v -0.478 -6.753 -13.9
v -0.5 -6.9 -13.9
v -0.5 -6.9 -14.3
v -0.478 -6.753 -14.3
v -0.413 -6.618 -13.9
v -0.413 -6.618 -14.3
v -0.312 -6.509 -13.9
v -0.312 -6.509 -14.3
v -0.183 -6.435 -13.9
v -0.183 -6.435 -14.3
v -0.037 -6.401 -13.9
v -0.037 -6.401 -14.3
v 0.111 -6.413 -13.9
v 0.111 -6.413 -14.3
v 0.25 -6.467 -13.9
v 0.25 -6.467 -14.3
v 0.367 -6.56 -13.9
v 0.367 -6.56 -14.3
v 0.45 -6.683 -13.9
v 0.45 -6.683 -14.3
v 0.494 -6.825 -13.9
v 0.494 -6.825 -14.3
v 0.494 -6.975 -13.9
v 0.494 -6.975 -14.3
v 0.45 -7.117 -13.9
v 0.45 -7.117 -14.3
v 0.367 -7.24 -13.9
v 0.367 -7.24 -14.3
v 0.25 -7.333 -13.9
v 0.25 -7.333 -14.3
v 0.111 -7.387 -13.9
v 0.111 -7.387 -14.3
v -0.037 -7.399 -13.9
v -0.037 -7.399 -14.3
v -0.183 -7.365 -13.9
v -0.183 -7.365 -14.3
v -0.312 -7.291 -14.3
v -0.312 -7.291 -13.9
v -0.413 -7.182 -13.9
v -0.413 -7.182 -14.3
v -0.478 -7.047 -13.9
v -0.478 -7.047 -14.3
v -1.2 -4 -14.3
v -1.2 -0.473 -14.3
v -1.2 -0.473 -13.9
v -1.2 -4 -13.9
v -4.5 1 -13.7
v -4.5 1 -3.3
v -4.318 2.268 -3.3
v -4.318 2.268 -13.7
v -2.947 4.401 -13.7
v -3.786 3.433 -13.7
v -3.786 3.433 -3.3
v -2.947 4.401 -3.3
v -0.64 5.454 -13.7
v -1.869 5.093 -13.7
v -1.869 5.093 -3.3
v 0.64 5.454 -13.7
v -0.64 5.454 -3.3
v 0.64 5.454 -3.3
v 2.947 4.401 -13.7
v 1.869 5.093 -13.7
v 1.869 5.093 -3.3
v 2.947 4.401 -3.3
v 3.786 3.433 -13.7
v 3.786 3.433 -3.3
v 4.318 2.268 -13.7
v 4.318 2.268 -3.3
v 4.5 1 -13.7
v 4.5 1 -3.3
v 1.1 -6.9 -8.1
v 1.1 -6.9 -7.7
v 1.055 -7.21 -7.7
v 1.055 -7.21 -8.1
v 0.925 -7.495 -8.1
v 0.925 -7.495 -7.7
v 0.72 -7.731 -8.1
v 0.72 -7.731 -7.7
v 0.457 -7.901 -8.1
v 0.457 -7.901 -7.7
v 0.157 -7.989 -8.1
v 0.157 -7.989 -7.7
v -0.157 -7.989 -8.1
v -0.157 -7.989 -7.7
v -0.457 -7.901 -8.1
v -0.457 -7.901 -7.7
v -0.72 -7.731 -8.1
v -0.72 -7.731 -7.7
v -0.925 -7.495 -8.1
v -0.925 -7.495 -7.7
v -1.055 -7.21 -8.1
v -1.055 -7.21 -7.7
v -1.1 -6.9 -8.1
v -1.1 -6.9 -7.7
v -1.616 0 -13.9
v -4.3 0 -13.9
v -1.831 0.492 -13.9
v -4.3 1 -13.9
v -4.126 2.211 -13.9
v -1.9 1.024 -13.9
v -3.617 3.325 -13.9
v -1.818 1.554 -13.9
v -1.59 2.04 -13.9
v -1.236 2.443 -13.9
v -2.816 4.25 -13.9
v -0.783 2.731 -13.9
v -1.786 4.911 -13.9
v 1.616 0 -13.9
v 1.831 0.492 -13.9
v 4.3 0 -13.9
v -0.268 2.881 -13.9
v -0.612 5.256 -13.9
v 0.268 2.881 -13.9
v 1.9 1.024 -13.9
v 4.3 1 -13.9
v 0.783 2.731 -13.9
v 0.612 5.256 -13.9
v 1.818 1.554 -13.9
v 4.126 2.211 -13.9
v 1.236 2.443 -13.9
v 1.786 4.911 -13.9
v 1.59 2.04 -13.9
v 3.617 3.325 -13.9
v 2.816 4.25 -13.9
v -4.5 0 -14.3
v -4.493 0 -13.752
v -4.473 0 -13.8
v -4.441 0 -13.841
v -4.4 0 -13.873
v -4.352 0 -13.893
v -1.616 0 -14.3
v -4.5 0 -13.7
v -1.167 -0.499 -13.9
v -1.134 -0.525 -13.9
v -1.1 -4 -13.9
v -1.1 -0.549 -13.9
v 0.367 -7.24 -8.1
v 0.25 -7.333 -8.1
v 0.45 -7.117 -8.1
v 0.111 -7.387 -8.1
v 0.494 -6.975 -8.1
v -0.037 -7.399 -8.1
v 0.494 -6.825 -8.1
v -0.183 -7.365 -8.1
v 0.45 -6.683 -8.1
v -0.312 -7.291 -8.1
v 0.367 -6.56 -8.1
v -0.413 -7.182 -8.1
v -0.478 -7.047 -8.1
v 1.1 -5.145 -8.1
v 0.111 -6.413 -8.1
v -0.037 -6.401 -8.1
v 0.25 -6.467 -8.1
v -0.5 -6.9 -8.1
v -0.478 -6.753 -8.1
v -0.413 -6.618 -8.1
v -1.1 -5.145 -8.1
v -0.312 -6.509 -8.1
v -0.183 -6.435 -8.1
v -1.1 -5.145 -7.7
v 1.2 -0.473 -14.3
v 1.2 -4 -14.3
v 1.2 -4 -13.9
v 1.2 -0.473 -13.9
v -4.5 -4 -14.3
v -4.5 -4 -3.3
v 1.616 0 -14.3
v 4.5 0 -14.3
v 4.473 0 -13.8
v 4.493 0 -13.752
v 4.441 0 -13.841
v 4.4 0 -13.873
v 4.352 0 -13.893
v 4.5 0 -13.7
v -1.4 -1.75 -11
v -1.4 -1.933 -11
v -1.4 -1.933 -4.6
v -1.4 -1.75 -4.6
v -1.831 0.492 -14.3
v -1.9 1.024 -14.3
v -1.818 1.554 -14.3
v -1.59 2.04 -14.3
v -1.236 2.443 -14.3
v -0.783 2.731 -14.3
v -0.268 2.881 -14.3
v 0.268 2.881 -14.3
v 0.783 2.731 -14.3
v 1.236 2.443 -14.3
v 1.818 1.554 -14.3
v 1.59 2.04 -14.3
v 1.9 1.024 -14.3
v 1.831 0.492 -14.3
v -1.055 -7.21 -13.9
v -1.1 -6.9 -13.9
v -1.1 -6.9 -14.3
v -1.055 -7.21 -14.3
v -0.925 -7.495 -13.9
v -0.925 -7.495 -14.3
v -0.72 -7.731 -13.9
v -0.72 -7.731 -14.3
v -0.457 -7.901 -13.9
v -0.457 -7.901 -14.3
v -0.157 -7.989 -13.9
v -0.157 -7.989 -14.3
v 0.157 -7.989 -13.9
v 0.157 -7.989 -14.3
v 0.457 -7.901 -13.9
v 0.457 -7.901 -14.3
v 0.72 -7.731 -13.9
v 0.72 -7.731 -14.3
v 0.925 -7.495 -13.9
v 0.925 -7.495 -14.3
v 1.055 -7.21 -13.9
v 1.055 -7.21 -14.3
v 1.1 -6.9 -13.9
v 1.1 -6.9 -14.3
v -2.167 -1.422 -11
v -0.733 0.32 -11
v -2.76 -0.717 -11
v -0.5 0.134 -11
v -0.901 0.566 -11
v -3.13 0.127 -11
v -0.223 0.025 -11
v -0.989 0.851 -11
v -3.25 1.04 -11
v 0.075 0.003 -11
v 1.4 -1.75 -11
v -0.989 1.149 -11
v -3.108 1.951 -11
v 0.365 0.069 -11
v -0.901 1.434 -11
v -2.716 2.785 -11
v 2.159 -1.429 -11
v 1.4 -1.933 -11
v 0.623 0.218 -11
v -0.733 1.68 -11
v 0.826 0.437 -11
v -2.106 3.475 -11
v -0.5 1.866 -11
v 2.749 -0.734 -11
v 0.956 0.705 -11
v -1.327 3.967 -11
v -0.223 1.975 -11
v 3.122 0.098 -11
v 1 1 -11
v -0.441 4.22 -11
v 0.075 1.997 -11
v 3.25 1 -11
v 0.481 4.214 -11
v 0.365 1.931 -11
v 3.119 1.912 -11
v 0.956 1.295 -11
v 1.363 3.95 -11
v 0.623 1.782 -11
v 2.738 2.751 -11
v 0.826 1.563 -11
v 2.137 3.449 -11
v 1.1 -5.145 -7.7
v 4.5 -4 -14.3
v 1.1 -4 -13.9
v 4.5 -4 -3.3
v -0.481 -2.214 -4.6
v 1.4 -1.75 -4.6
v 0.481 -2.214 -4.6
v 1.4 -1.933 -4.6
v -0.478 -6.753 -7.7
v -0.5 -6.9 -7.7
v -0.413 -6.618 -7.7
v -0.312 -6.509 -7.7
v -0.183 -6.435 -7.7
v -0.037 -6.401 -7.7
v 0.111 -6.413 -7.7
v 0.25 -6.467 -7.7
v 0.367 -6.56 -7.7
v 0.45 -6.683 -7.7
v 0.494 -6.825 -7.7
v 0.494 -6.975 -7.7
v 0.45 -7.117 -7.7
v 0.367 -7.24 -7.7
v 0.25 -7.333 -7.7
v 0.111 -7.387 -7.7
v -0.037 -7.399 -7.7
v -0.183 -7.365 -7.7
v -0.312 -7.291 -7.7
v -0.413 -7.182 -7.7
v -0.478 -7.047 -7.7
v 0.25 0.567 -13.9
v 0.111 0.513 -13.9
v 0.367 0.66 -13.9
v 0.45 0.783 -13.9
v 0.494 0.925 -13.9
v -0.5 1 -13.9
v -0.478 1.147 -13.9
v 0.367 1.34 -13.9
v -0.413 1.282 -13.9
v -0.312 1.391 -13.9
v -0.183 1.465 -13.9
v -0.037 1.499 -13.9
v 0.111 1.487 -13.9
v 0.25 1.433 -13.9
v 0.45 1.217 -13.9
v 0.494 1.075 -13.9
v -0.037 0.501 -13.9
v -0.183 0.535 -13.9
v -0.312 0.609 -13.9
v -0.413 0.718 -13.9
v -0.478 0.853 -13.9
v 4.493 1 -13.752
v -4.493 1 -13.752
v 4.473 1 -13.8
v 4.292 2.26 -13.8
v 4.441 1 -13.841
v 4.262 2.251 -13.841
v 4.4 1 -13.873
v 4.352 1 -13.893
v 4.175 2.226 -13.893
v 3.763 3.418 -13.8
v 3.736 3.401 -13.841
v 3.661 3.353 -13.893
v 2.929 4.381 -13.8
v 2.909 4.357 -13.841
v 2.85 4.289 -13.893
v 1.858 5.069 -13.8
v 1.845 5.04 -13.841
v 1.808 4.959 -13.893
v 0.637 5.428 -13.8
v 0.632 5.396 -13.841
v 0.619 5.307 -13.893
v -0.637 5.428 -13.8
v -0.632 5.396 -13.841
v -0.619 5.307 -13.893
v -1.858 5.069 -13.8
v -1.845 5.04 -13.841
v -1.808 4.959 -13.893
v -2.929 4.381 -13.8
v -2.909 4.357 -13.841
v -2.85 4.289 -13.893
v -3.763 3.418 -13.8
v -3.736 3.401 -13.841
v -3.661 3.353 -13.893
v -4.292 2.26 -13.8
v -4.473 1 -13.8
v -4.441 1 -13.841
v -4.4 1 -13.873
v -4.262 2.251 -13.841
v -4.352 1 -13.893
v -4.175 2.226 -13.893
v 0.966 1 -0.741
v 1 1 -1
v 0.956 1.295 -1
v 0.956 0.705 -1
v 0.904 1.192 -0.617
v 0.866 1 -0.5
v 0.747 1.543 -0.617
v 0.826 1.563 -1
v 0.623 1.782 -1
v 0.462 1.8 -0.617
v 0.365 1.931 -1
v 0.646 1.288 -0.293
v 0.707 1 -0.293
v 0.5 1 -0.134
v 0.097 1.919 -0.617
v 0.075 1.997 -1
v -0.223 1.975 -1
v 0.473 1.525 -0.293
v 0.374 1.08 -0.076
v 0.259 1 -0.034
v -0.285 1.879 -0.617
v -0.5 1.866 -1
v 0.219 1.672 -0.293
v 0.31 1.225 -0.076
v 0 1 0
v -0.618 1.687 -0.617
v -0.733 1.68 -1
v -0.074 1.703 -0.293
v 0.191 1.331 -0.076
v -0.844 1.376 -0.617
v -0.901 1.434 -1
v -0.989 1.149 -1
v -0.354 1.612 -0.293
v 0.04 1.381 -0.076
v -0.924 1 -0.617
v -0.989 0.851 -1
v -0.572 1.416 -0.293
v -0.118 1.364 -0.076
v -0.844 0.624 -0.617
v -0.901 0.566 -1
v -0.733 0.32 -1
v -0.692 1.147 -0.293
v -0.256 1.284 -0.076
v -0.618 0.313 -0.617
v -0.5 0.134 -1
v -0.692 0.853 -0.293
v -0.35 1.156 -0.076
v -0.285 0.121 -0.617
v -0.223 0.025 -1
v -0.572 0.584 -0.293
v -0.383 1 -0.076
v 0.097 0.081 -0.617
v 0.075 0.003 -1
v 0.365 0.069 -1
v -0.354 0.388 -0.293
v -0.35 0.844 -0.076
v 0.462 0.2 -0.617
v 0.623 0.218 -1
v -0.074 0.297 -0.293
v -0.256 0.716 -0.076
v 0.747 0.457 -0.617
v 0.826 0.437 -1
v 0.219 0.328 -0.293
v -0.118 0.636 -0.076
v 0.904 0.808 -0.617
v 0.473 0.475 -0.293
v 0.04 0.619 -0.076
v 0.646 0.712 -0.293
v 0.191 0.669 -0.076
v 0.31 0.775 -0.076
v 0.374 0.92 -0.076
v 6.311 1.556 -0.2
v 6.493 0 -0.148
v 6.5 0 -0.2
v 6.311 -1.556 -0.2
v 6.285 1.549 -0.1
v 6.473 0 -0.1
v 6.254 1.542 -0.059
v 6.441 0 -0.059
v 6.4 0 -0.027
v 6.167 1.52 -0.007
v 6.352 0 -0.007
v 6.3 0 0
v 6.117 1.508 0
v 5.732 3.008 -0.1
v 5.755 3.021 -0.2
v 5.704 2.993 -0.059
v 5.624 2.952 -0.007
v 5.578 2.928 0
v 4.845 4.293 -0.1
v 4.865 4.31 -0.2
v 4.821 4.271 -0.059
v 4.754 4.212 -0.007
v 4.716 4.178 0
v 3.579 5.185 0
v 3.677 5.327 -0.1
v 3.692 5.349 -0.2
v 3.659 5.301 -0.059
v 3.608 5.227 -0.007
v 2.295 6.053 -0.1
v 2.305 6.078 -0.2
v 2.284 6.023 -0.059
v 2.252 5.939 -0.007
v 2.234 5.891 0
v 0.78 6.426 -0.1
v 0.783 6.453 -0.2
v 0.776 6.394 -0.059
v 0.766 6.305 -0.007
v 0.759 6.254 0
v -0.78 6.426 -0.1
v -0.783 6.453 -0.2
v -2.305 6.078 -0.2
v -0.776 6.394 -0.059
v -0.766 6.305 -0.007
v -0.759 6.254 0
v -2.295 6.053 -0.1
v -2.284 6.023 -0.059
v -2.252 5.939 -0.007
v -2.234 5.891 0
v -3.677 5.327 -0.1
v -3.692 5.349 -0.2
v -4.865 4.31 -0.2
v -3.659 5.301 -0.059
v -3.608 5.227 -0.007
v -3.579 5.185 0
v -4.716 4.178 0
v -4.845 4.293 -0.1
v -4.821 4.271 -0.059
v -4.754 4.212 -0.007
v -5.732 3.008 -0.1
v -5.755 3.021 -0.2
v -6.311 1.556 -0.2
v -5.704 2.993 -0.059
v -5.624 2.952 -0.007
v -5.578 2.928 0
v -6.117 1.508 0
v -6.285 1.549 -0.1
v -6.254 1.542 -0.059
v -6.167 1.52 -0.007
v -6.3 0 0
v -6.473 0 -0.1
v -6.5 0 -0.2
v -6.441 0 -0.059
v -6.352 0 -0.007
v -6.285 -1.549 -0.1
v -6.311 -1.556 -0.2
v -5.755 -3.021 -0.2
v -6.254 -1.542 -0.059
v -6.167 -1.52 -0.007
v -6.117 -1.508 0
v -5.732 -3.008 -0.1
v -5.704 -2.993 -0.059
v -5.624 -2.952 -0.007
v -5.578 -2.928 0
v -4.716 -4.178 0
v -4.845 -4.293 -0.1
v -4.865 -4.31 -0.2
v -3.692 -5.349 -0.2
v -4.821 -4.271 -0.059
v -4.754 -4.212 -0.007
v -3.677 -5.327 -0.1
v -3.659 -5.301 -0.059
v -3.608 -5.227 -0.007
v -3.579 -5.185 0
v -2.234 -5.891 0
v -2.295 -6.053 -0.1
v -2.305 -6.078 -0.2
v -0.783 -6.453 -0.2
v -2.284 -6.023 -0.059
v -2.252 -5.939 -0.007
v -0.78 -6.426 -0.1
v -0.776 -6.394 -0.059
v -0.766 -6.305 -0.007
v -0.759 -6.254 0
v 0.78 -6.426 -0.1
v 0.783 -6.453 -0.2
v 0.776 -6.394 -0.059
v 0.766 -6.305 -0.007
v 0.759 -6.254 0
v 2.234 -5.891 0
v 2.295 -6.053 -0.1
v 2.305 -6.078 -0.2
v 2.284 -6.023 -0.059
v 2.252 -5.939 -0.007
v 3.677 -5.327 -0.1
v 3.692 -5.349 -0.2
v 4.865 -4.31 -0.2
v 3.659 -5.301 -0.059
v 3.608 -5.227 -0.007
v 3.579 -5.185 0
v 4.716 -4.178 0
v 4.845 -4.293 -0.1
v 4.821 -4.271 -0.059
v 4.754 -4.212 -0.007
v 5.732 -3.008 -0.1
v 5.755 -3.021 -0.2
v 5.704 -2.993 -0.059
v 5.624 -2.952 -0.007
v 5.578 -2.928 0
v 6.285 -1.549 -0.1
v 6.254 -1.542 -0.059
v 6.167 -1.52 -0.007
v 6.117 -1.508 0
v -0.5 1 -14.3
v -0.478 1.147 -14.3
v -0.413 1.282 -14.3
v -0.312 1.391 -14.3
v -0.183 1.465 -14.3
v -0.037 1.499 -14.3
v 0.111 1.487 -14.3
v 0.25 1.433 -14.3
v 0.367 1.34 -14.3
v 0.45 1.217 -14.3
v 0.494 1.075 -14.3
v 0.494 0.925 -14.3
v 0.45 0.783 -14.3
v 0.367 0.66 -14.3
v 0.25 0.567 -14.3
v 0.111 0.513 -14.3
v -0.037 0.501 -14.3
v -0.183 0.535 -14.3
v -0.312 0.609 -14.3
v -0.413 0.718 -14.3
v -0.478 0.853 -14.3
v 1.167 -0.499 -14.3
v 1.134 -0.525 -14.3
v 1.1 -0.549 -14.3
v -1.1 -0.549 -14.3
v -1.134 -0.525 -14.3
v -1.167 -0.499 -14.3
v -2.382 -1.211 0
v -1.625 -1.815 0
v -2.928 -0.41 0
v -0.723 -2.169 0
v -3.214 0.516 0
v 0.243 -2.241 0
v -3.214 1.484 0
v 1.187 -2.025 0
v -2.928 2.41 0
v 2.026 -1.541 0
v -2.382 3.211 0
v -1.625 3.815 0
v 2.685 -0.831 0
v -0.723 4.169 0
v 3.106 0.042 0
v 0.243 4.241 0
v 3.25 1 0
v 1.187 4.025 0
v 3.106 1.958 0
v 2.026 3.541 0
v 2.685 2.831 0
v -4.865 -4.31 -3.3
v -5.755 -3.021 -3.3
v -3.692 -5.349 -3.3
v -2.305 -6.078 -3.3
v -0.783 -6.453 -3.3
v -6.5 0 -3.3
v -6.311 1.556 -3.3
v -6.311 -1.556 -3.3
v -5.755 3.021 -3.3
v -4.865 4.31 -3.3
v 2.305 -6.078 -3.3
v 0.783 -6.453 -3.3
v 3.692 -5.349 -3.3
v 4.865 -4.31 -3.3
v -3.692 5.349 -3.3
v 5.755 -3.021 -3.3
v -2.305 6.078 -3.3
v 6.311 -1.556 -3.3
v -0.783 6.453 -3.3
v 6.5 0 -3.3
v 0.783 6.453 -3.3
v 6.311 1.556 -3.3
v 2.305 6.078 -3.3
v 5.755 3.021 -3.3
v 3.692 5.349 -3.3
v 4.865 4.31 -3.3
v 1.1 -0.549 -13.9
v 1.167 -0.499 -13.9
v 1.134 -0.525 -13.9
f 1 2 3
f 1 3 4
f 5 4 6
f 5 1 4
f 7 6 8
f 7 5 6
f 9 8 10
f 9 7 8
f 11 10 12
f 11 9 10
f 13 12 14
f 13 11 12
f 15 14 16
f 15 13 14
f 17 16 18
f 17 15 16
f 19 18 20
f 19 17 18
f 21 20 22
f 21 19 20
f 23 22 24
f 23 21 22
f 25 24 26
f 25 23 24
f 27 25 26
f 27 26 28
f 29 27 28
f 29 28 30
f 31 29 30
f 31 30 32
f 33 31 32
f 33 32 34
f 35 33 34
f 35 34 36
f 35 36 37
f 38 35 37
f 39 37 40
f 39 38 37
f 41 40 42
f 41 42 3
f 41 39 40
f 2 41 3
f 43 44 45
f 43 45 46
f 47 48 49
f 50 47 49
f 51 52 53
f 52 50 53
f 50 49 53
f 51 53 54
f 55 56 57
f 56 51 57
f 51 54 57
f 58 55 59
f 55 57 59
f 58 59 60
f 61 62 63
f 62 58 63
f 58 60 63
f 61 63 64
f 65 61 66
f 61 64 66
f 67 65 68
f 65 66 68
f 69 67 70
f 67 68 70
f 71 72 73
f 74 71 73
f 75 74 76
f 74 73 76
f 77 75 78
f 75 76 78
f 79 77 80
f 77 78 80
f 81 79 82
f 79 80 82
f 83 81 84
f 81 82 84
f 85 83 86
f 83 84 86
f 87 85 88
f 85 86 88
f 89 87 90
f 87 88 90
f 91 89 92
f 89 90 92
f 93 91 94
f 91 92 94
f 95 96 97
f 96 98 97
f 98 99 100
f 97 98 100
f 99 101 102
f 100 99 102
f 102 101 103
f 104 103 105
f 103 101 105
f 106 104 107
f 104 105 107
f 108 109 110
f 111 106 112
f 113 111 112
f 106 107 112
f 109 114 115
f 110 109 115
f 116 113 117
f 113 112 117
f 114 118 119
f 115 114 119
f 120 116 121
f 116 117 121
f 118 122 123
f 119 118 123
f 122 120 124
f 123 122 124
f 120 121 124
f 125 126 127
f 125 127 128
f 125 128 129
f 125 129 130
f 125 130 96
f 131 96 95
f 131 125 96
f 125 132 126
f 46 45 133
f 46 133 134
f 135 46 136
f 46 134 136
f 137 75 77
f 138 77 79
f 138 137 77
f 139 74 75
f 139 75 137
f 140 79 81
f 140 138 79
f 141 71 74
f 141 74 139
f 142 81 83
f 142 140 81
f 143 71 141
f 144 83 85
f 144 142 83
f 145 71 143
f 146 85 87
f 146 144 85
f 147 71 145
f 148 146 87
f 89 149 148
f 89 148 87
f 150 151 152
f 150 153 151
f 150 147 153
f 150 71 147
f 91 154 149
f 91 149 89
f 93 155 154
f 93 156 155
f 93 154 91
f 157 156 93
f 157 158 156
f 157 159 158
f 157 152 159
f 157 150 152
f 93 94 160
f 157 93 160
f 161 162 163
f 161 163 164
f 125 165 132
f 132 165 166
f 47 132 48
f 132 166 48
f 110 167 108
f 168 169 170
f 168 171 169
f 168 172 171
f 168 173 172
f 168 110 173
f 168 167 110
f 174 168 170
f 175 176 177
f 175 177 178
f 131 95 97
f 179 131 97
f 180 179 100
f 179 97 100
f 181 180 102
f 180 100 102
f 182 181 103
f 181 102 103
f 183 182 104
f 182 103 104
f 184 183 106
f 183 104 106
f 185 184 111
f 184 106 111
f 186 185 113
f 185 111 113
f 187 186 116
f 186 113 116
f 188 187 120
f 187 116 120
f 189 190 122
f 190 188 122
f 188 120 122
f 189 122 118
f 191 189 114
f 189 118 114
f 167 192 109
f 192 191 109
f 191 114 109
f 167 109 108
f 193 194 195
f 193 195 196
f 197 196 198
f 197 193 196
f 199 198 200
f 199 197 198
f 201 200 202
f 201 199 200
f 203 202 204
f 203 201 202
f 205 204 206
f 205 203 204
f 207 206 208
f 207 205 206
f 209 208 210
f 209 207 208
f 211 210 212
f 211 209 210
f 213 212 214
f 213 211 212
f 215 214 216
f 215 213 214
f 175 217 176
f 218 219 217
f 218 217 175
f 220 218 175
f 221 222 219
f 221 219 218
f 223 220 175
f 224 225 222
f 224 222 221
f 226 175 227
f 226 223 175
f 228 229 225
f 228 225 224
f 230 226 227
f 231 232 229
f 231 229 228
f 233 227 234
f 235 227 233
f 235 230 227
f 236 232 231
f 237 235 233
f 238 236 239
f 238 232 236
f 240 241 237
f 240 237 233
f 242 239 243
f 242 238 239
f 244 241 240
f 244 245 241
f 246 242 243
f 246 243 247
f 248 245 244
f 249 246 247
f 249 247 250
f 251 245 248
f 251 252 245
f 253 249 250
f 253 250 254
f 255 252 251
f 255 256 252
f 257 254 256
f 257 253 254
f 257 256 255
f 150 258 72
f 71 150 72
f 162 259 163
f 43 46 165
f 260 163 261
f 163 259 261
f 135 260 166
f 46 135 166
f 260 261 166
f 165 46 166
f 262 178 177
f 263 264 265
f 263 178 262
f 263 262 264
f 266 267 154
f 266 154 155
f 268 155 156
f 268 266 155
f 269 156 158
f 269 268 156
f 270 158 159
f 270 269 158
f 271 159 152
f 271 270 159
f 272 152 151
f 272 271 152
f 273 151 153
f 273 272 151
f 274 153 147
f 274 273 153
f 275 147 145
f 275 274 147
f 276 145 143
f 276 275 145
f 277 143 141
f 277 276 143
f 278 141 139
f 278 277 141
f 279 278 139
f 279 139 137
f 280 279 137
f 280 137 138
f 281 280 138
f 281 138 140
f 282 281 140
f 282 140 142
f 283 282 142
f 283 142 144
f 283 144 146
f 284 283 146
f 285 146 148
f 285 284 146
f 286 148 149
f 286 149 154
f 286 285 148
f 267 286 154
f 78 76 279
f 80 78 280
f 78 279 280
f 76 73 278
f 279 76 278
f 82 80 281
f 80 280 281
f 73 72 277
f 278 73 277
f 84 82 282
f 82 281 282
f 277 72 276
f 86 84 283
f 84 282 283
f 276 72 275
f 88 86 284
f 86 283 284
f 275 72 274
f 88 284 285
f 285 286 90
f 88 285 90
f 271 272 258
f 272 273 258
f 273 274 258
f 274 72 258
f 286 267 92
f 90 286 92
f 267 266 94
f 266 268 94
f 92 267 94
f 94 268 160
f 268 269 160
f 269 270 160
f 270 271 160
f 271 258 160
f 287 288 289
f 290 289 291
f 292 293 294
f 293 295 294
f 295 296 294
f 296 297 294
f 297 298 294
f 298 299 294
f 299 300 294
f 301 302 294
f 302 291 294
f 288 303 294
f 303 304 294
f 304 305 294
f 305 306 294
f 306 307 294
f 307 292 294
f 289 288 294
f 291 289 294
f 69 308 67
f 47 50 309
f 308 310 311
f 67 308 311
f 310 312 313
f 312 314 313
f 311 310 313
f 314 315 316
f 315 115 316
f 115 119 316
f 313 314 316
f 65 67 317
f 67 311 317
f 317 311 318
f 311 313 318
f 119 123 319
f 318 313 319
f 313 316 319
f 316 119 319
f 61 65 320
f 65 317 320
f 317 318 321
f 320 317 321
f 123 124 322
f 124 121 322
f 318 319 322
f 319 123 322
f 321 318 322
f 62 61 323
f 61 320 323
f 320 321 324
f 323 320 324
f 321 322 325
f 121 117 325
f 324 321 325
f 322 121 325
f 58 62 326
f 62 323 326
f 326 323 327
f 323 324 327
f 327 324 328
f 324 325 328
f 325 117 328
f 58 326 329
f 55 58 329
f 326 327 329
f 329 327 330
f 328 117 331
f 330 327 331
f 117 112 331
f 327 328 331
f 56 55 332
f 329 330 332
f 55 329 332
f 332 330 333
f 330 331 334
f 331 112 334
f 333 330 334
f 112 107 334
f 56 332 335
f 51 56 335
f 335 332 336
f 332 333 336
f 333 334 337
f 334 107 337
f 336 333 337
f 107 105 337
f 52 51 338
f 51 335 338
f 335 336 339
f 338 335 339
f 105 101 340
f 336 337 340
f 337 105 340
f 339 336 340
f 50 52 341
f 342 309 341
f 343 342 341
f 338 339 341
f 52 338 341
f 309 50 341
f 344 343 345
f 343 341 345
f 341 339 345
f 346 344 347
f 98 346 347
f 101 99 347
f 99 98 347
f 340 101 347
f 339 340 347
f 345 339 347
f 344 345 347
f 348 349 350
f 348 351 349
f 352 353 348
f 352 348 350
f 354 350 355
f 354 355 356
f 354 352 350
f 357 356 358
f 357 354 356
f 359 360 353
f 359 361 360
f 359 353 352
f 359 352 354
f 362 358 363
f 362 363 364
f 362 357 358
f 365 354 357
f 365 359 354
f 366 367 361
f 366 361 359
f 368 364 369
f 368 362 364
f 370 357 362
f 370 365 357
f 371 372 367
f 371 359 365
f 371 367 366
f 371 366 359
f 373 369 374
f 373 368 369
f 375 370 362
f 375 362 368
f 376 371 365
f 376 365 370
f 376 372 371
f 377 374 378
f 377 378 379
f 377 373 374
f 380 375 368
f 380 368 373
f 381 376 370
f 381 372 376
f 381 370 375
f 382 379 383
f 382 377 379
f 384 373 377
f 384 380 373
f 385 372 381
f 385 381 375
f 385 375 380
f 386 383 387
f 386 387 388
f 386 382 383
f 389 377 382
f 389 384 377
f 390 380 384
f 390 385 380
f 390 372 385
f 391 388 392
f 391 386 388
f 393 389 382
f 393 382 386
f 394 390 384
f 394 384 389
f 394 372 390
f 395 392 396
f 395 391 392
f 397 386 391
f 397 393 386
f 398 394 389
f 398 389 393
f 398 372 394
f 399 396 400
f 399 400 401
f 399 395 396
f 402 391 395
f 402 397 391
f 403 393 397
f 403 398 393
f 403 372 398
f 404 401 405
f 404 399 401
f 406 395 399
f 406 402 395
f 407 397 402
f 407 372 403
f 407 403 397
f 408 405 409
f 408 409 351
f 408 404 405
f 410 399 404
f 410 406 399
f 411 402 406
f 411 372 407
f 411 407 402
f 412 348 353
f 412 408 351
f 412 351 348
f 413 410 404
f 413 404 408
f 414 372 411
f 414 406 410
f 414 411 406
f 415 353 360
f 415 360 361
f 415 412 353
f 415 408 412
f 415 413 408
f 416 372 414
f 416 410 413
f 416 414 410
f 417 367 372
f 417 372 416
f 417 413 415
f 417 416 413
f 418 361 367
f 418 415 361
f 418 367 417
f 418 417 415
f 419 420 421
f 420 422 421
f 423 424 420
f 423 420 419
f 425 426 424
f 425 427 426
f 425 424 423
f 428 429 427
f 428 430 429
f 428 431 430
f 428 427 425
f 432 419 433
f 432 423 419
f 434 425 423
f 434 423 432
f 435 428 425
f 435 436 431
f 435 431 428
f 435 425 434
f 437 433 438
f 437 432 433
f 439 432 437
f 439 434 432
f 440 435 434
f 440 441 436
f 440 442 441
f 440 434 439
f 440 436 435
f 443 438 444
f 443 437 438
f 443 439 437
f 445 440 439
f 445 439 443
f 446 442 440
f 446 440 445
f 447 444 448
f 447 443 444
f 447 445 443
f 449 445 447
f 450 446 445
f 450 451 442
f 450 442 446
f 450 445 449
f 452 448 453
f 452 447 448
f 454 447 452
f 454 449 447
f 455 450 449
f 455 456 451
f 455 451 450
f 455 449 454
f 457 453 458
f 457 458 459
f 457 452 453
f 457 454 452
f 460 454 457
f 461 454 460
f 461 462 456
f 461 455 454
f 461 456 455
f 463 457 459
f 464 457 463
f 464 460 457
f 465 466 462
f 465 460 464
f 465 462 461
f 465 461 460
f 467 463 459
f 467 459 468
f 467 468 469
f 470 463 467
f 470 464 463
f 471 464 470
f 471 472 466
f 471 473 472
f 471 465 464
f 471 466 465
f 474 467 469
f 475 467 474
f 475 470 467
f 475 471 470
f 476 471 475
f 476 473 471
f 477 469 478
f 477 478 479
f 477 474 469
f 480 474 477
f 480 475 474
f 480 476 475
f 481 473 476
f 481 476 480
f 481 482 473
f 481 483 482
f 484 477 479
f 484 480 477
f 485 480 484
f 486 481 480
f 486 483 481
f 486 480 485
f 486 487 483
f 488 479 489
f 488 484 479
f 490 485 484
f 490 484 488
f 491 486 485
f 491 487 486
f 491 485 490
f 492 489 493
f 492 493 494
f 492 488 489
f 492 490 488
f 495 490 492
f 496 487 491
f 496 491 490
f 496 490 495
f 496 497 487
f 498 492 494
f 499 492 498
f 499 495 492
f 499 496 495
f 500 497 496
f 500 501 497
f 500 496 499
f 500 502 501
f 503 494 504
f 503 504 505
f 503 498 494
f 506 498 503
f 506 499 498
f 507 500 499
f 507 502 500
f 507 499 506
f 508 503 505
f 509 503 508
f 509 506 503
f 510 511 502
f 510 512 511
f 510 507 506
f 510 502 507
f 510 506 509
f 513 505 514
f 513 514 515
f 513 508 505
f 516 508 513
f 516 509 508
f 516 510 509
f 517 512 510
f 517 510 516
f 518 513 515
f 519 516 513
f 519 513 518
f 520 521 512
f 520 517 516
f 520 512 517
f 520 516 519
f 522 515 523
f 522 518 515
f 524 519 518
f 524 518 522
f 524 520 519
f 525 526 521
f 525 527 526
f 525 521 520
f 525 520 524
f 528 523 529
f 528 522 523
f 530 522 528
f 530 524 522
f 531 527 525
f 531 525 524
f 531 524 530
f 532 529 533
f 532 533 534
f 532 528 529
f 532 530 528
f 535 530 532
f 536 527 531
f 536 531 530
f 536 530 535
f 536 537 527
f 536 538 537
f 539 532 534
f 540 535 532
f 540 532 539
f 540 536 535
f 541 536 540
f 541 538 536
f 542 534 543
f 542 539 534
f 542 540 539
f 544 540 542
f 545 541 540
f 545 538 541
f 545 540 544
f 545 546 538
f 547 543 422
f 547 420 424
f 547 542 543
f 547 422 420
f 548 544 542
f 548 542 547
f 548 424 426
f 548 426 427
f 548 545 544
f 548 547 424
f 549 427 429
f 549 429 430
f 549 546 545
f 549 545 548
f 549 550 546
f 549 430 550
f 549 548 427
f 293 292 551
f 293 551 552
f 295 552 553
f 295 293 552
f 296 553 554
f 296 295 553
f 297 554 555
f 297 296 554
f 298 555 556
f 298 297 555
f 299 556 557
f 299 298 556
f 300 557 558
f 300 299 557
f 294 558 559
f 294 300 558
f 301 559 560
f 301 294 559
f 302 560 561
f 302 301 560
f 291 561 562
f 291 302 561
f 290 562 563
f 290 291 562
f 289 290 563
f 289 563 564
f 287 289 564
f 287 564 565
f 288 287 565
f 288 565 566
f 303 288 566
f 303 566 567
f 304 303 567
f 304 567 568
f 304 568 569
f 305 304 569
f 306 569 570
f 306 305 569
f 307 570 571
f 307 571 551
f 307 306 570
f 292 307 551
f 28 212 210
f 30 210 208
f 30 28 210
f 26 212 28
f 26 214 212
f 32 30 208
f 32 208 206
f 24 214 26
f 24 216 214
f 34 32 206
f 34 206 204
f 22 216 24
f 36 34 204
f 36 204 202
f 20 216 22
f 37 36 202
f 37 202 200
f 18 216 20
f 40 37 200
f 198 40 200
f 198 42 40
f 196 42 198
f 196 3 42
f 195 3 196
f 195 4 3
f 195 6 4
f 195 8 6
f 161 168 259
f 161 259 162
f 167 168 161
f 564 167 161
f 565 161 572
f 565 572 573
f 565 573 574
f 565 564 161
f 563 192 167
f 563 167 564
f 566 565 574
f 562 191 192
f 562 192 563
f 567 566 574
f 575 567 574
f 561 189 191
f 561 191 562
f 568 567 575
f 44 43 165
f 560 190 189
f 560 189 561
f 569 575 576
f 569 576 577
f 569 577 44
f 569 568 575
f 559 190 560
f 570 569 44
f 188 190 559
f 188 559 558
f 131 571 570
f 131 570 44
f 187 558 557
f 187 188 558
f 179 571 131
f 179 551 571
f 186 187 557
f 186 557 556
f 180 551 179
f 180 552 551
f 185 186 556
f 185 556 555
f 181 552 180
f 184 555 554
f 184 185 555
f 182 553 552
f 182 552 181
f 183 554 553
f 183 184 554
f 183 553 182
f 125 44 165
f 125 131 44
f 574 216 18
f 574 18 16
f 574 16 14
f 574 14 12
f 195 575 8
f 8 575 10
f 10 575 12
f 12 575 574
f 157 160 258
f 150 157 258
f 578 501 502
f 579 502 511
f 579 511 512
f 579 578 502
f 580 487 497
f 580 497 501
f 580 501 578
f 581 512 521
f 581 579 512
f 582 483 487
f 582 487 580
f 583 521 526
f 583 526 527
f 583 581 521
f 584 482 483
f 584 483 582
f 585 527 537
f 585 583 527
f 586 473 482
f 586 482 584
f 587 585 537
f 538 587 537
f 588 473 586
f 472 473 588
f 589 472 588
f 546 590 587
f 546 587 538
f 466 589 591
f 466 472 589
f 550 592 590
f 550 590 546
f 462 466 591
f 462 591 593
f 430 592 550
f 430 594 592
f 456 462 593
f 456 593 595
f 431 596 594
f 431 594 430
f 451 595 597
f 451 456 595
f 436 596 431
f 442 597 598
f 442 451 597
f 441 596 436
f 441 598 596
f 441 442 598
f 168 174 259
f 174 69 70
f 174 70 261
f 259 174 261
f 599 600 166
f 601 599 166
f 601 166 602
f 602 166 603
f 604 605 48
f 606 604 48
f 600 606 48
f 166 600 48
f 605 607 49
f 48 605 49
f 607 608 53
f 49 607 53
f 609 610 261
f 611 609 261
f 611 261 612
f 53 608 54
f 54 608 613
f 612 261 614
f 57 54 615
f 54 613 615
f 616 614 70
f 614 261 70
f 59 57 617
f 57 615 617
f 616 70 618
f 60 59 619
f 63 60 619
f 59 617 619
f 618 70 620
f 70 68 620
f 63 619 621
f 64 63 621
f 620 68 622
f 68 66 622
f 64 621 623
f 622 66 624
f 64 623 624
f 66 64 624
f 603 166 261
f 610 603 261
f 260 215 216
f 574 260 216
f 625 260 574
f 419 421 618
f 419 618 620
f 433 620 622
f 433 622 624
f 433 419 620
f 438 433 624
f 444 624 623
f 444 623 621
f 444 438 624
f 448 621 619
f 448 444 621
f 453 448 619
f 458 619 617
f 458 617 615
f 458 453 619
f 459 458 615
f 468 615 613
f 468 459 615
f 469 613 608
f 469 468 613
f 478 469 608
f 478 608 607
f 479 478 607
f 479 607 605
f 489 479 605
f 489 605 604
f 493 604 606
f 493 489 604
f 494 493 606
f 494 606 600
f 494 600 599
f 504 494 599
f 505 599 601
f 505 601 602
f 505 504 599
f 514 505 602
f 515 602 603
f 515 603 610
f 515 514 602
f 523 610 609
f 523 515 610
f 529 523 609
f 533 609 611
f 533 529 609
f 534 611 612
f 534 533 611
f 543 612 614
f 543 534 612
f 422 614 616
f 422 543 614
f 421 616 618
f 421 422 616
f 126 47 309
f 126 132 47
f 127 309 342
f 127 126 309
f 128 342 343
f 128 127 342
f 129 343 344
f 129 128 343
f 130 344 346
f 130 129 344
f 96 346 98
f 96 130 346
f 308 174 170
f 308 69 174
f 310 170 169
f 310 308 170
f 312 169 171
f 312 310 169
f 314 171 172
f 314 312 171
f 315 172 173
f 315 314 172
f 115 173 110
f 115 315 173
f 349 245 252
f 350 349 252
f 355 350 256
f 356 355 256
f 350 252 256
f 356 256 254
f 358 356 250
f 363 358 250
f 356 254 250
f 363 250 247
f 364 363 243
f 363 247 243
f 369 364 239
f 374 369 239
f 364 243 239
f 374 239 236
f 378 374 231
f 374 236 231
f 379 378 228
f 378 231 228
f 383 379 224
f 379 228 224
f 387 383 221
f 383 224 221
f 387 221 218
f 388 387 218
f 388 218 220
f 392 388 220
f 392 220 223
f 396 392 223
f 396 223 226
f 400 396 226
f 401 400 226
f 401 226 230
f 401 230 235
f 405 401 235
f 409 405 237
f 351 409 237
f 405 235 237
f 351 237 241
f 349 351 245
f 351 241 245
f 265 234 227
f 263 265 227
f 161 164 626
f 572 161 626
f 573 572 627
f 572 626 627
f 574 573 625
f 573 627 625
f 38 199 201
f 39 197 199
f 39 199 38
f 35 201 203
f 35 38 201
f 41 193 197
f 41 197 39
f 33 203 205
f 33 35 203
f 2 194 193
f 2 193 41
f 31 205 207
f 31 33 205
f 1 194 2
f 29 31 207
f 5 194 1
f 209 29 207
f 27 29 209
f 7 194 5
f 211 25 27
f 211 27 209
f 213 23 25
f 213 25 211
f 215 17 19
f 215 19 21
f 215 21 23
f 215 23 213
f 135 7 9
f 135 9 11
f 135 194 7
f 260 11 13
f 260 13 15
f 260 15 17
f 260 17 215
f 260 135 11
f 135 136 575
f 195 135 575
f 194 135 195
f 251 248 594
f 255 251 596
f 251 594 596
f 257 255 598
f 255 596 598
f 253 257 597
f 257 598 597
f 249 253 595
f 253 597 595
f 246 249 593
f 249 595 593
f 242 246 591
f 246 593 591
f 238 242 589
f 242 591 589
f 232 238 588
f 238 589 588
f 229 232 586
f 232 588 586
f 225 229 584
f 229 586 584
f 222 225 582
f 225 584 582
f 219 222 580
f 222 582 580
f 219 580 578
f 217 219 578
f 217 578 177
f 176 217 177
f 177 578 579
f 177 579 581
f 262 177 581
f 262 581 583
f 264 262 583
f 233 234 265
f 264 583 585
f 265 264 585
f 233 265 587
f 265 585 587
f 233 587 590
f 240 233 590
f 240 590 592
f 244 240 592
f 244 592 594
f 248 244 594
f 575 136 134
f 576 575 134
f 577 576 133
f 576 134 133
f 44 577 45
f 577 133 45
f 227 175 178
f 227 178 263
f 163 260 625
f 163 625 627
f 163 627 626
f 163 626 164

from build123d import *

# Parameters (mm, degrees)
SKETCH1_R           = 6.5
BOSS_EXTRUDE1_DEPTH = 3.3
BOSS_EXTRUDE2_DEPTH = 11
SKETCH3_R           = 3.25
CUT_EXTRUDE1_DEPTH  = 11
SKETCH4_R           = 1
BOSS_EXTRUDE3_DEPTH = 11
FILLET1_R           = 1
CUT_EXTRUDE2_DEPTH  = 0.4
SKETCH6_R           = 0.5
BOSS_EXTRUDE4_DEPTH = 0.4
BOSS_EXTRUDE5_START = -0.4
SKETCH7_R           = 1.9
SKETCH7_R_2         = 0.5
BOSS_EXTRUDE5_DEPTH = 0.4
BOSS_EXTRUDE6_START = -0.4
SKETCH8_R           = 0.5
BOSS_EXTRUDE6_DEPTH = 0.4
SKETCH10_W          = 2.8
SKETCH10_H          = 1
BOSS_EXTRUDE8_DEPTH = 6.4
FILLET4_R           = 0.2
REDONDEO1_R         = 0.2


with BuildPart() as part:
    # Sketch1 → Boss-Extrude1 (new body)
    with BuildSketch(Plane.XY):
        Circle(SKETCH1_R)
    extrude(amount=-BOSS_EXTRUDE1_DEPTH)

    # Sketch2 → Boss-Extrude2 (add)
    with BuildSketch(Plane(origin=(0, 0, -3.3), x_dir=(-1, 0, 0), z_dir=(0, 0, -1))):
        with BuildLine():
            Line((-4.5, -4), (4.5, -4))
            Line((4.5, -4), (4.5, 1))
            ThreePointArc((4.5, 1), (0, 5.5), (-4.5, 1))
            Line((-4.5, 1), (-4.5, -4))
        make_face()
    extrude(amount=BOSS_EXTRUDE2_DEPTH)

    # Sketch3 → Cut-Extrude1 (cut)
    with BuildSketch(Plane.XY):
        with Locations((0, 1)):
            Circle(SKETCH3_R)
    extrude(amount=-CUT_EXTRUDE1_DEPTH, mode=Mode.SUBTRACT)

    # Sketch4 → Boss-Extrude3 (add)
    with BuildSketch(Plane.XY.offset(-11)):
        with Locations((0, 1)):
            Circle(SKETCH4_R)
    extrude(amount=BOSS_EXTRUDE3_DEPTH)

    # Fillet1
    fillet1_edges = [part.edges().sort_by_distance(p)[0] for p in [
        (-1, 1, 0),
    ]]
    fillet(fillet1_edges, radius=FILLET1_R)

    # Sketch5 → Cut-Extrude2 (cut)
    with BuildSketch(Plane(origin=(0, 0, -14.3), x_dir=(-1, 0, 0), z_dir=(0, 0, -1))):
        Polygon((4.5, 0), (1.2, 0), (1.2, -4), (-1.2, -4), (-1.2, 0), (-4.5, 0), (-4.5, 5.5), (4.5, 5.5), align=None)
    extrude(amount=-CUT_EXTRUDE2_DEPTH, mode=Mode.SUBTRACT)

    # Sketch6 → Boss-Extrude4 (add)
    with BuildSketch(Plane(origin=(0, 0, -13.9), x_dir=(-1, 0, 0), z_dir=(0, 0, -1))):
        with BuildLine():
            Line((-1.1, -6.9), (-1.1, 1))
            ThreePointArc((-1.1, 1), (0, 2.1), (1.1, 1))
            Line((1.1, 1), (1.1, -6.9))
            ThreePointArc((1.1, -6.9), (0, -8), (-1.1, -6.9))
        make_face()
        with Locations((0, -6.9)):
            Circle(SKETCH6_R, mode=Mode.SUBTRACT)
        with Locations((0, 1)):
            Circle(SKETCH6_R, mode=Mode.SUBTRACT)
    extrude(amount=BOSS_EXTRUDE4_DEPTH)

    # Sketch7 → Boss-Extrude5 (add)
    with BuildSketch(Plane(origin=(0, 0, -14.3), x_dir=(-1, 0, 0), z_dir=(0, 0, -1)).offset(BOSS_EXTRUDE5_START)):
        with Locations((0, 1)):
            Circle(SKETCH7_R)
        with Locations((0, 1)):
            Circle(SKETCH7_R_2, mode=Mode.SUBTRACT)
    extrude(amount=BOSS_EXTRUDE5_DEPTH)

    # Sketch10 → Boss-Extrude8 (add)
    with BuildSketch(Plane.XY.offset(-11)):
        with Locations((0, -2.25)):
            Rectangle(SKETCH10_W, SKETCH10_H)
    extrude(amount=BOSS_EXTRUDE8_DEPTH)

    # Fillet4
    fillet4_edges = [part.edges().sort_by_distance(p)[0] for p in [
        (0, 5.5, -13.9),
        (4.5, 0.5, -13.9),
        (-4.5, 0.5, -13.9),
    ]]
    fillet(fillet4_edges, radius=FILLET4_R)

    # Redondeo1
    redondeo1_edges = [part.edges().sort_by_distance(p)[0] for p in [
        (-6.5, 0, 0),
    ]]
    fillet(redondeo1_edges, radius=REDONDEO1_R)


with BuildPart() as body_2:
    # Sketch8 → Boss-Extrude6 (new body)
    with BuildSketch(Plane(origin=(0, 0, -8.1), x_dir=(-1, 0, 0), z_dir=(0, 0, -1)).offset(BOSS_EXTRUDE6_START)):
        with BuildLine():
            Line((-1.1, -5.145239298), (-1.1, -6.9))
            ThreePointArc((-1.1, -6.9), (0, -8), (1.1, -6.9))
            Line((1.1, -6.9), (1.1, -5.145239298))
            Line((1.1, -5.145239298), (-1.1, -5.145239298))
        make_face()
        with Locations((0, -6.9)):
            Circle(SKETCH8_R, mode=Mode.SUBTRACT)
    extrude(amount=BOSS_EXTRUDE6_DEPTH)


solid = Compound([part.part, body_2.part])
